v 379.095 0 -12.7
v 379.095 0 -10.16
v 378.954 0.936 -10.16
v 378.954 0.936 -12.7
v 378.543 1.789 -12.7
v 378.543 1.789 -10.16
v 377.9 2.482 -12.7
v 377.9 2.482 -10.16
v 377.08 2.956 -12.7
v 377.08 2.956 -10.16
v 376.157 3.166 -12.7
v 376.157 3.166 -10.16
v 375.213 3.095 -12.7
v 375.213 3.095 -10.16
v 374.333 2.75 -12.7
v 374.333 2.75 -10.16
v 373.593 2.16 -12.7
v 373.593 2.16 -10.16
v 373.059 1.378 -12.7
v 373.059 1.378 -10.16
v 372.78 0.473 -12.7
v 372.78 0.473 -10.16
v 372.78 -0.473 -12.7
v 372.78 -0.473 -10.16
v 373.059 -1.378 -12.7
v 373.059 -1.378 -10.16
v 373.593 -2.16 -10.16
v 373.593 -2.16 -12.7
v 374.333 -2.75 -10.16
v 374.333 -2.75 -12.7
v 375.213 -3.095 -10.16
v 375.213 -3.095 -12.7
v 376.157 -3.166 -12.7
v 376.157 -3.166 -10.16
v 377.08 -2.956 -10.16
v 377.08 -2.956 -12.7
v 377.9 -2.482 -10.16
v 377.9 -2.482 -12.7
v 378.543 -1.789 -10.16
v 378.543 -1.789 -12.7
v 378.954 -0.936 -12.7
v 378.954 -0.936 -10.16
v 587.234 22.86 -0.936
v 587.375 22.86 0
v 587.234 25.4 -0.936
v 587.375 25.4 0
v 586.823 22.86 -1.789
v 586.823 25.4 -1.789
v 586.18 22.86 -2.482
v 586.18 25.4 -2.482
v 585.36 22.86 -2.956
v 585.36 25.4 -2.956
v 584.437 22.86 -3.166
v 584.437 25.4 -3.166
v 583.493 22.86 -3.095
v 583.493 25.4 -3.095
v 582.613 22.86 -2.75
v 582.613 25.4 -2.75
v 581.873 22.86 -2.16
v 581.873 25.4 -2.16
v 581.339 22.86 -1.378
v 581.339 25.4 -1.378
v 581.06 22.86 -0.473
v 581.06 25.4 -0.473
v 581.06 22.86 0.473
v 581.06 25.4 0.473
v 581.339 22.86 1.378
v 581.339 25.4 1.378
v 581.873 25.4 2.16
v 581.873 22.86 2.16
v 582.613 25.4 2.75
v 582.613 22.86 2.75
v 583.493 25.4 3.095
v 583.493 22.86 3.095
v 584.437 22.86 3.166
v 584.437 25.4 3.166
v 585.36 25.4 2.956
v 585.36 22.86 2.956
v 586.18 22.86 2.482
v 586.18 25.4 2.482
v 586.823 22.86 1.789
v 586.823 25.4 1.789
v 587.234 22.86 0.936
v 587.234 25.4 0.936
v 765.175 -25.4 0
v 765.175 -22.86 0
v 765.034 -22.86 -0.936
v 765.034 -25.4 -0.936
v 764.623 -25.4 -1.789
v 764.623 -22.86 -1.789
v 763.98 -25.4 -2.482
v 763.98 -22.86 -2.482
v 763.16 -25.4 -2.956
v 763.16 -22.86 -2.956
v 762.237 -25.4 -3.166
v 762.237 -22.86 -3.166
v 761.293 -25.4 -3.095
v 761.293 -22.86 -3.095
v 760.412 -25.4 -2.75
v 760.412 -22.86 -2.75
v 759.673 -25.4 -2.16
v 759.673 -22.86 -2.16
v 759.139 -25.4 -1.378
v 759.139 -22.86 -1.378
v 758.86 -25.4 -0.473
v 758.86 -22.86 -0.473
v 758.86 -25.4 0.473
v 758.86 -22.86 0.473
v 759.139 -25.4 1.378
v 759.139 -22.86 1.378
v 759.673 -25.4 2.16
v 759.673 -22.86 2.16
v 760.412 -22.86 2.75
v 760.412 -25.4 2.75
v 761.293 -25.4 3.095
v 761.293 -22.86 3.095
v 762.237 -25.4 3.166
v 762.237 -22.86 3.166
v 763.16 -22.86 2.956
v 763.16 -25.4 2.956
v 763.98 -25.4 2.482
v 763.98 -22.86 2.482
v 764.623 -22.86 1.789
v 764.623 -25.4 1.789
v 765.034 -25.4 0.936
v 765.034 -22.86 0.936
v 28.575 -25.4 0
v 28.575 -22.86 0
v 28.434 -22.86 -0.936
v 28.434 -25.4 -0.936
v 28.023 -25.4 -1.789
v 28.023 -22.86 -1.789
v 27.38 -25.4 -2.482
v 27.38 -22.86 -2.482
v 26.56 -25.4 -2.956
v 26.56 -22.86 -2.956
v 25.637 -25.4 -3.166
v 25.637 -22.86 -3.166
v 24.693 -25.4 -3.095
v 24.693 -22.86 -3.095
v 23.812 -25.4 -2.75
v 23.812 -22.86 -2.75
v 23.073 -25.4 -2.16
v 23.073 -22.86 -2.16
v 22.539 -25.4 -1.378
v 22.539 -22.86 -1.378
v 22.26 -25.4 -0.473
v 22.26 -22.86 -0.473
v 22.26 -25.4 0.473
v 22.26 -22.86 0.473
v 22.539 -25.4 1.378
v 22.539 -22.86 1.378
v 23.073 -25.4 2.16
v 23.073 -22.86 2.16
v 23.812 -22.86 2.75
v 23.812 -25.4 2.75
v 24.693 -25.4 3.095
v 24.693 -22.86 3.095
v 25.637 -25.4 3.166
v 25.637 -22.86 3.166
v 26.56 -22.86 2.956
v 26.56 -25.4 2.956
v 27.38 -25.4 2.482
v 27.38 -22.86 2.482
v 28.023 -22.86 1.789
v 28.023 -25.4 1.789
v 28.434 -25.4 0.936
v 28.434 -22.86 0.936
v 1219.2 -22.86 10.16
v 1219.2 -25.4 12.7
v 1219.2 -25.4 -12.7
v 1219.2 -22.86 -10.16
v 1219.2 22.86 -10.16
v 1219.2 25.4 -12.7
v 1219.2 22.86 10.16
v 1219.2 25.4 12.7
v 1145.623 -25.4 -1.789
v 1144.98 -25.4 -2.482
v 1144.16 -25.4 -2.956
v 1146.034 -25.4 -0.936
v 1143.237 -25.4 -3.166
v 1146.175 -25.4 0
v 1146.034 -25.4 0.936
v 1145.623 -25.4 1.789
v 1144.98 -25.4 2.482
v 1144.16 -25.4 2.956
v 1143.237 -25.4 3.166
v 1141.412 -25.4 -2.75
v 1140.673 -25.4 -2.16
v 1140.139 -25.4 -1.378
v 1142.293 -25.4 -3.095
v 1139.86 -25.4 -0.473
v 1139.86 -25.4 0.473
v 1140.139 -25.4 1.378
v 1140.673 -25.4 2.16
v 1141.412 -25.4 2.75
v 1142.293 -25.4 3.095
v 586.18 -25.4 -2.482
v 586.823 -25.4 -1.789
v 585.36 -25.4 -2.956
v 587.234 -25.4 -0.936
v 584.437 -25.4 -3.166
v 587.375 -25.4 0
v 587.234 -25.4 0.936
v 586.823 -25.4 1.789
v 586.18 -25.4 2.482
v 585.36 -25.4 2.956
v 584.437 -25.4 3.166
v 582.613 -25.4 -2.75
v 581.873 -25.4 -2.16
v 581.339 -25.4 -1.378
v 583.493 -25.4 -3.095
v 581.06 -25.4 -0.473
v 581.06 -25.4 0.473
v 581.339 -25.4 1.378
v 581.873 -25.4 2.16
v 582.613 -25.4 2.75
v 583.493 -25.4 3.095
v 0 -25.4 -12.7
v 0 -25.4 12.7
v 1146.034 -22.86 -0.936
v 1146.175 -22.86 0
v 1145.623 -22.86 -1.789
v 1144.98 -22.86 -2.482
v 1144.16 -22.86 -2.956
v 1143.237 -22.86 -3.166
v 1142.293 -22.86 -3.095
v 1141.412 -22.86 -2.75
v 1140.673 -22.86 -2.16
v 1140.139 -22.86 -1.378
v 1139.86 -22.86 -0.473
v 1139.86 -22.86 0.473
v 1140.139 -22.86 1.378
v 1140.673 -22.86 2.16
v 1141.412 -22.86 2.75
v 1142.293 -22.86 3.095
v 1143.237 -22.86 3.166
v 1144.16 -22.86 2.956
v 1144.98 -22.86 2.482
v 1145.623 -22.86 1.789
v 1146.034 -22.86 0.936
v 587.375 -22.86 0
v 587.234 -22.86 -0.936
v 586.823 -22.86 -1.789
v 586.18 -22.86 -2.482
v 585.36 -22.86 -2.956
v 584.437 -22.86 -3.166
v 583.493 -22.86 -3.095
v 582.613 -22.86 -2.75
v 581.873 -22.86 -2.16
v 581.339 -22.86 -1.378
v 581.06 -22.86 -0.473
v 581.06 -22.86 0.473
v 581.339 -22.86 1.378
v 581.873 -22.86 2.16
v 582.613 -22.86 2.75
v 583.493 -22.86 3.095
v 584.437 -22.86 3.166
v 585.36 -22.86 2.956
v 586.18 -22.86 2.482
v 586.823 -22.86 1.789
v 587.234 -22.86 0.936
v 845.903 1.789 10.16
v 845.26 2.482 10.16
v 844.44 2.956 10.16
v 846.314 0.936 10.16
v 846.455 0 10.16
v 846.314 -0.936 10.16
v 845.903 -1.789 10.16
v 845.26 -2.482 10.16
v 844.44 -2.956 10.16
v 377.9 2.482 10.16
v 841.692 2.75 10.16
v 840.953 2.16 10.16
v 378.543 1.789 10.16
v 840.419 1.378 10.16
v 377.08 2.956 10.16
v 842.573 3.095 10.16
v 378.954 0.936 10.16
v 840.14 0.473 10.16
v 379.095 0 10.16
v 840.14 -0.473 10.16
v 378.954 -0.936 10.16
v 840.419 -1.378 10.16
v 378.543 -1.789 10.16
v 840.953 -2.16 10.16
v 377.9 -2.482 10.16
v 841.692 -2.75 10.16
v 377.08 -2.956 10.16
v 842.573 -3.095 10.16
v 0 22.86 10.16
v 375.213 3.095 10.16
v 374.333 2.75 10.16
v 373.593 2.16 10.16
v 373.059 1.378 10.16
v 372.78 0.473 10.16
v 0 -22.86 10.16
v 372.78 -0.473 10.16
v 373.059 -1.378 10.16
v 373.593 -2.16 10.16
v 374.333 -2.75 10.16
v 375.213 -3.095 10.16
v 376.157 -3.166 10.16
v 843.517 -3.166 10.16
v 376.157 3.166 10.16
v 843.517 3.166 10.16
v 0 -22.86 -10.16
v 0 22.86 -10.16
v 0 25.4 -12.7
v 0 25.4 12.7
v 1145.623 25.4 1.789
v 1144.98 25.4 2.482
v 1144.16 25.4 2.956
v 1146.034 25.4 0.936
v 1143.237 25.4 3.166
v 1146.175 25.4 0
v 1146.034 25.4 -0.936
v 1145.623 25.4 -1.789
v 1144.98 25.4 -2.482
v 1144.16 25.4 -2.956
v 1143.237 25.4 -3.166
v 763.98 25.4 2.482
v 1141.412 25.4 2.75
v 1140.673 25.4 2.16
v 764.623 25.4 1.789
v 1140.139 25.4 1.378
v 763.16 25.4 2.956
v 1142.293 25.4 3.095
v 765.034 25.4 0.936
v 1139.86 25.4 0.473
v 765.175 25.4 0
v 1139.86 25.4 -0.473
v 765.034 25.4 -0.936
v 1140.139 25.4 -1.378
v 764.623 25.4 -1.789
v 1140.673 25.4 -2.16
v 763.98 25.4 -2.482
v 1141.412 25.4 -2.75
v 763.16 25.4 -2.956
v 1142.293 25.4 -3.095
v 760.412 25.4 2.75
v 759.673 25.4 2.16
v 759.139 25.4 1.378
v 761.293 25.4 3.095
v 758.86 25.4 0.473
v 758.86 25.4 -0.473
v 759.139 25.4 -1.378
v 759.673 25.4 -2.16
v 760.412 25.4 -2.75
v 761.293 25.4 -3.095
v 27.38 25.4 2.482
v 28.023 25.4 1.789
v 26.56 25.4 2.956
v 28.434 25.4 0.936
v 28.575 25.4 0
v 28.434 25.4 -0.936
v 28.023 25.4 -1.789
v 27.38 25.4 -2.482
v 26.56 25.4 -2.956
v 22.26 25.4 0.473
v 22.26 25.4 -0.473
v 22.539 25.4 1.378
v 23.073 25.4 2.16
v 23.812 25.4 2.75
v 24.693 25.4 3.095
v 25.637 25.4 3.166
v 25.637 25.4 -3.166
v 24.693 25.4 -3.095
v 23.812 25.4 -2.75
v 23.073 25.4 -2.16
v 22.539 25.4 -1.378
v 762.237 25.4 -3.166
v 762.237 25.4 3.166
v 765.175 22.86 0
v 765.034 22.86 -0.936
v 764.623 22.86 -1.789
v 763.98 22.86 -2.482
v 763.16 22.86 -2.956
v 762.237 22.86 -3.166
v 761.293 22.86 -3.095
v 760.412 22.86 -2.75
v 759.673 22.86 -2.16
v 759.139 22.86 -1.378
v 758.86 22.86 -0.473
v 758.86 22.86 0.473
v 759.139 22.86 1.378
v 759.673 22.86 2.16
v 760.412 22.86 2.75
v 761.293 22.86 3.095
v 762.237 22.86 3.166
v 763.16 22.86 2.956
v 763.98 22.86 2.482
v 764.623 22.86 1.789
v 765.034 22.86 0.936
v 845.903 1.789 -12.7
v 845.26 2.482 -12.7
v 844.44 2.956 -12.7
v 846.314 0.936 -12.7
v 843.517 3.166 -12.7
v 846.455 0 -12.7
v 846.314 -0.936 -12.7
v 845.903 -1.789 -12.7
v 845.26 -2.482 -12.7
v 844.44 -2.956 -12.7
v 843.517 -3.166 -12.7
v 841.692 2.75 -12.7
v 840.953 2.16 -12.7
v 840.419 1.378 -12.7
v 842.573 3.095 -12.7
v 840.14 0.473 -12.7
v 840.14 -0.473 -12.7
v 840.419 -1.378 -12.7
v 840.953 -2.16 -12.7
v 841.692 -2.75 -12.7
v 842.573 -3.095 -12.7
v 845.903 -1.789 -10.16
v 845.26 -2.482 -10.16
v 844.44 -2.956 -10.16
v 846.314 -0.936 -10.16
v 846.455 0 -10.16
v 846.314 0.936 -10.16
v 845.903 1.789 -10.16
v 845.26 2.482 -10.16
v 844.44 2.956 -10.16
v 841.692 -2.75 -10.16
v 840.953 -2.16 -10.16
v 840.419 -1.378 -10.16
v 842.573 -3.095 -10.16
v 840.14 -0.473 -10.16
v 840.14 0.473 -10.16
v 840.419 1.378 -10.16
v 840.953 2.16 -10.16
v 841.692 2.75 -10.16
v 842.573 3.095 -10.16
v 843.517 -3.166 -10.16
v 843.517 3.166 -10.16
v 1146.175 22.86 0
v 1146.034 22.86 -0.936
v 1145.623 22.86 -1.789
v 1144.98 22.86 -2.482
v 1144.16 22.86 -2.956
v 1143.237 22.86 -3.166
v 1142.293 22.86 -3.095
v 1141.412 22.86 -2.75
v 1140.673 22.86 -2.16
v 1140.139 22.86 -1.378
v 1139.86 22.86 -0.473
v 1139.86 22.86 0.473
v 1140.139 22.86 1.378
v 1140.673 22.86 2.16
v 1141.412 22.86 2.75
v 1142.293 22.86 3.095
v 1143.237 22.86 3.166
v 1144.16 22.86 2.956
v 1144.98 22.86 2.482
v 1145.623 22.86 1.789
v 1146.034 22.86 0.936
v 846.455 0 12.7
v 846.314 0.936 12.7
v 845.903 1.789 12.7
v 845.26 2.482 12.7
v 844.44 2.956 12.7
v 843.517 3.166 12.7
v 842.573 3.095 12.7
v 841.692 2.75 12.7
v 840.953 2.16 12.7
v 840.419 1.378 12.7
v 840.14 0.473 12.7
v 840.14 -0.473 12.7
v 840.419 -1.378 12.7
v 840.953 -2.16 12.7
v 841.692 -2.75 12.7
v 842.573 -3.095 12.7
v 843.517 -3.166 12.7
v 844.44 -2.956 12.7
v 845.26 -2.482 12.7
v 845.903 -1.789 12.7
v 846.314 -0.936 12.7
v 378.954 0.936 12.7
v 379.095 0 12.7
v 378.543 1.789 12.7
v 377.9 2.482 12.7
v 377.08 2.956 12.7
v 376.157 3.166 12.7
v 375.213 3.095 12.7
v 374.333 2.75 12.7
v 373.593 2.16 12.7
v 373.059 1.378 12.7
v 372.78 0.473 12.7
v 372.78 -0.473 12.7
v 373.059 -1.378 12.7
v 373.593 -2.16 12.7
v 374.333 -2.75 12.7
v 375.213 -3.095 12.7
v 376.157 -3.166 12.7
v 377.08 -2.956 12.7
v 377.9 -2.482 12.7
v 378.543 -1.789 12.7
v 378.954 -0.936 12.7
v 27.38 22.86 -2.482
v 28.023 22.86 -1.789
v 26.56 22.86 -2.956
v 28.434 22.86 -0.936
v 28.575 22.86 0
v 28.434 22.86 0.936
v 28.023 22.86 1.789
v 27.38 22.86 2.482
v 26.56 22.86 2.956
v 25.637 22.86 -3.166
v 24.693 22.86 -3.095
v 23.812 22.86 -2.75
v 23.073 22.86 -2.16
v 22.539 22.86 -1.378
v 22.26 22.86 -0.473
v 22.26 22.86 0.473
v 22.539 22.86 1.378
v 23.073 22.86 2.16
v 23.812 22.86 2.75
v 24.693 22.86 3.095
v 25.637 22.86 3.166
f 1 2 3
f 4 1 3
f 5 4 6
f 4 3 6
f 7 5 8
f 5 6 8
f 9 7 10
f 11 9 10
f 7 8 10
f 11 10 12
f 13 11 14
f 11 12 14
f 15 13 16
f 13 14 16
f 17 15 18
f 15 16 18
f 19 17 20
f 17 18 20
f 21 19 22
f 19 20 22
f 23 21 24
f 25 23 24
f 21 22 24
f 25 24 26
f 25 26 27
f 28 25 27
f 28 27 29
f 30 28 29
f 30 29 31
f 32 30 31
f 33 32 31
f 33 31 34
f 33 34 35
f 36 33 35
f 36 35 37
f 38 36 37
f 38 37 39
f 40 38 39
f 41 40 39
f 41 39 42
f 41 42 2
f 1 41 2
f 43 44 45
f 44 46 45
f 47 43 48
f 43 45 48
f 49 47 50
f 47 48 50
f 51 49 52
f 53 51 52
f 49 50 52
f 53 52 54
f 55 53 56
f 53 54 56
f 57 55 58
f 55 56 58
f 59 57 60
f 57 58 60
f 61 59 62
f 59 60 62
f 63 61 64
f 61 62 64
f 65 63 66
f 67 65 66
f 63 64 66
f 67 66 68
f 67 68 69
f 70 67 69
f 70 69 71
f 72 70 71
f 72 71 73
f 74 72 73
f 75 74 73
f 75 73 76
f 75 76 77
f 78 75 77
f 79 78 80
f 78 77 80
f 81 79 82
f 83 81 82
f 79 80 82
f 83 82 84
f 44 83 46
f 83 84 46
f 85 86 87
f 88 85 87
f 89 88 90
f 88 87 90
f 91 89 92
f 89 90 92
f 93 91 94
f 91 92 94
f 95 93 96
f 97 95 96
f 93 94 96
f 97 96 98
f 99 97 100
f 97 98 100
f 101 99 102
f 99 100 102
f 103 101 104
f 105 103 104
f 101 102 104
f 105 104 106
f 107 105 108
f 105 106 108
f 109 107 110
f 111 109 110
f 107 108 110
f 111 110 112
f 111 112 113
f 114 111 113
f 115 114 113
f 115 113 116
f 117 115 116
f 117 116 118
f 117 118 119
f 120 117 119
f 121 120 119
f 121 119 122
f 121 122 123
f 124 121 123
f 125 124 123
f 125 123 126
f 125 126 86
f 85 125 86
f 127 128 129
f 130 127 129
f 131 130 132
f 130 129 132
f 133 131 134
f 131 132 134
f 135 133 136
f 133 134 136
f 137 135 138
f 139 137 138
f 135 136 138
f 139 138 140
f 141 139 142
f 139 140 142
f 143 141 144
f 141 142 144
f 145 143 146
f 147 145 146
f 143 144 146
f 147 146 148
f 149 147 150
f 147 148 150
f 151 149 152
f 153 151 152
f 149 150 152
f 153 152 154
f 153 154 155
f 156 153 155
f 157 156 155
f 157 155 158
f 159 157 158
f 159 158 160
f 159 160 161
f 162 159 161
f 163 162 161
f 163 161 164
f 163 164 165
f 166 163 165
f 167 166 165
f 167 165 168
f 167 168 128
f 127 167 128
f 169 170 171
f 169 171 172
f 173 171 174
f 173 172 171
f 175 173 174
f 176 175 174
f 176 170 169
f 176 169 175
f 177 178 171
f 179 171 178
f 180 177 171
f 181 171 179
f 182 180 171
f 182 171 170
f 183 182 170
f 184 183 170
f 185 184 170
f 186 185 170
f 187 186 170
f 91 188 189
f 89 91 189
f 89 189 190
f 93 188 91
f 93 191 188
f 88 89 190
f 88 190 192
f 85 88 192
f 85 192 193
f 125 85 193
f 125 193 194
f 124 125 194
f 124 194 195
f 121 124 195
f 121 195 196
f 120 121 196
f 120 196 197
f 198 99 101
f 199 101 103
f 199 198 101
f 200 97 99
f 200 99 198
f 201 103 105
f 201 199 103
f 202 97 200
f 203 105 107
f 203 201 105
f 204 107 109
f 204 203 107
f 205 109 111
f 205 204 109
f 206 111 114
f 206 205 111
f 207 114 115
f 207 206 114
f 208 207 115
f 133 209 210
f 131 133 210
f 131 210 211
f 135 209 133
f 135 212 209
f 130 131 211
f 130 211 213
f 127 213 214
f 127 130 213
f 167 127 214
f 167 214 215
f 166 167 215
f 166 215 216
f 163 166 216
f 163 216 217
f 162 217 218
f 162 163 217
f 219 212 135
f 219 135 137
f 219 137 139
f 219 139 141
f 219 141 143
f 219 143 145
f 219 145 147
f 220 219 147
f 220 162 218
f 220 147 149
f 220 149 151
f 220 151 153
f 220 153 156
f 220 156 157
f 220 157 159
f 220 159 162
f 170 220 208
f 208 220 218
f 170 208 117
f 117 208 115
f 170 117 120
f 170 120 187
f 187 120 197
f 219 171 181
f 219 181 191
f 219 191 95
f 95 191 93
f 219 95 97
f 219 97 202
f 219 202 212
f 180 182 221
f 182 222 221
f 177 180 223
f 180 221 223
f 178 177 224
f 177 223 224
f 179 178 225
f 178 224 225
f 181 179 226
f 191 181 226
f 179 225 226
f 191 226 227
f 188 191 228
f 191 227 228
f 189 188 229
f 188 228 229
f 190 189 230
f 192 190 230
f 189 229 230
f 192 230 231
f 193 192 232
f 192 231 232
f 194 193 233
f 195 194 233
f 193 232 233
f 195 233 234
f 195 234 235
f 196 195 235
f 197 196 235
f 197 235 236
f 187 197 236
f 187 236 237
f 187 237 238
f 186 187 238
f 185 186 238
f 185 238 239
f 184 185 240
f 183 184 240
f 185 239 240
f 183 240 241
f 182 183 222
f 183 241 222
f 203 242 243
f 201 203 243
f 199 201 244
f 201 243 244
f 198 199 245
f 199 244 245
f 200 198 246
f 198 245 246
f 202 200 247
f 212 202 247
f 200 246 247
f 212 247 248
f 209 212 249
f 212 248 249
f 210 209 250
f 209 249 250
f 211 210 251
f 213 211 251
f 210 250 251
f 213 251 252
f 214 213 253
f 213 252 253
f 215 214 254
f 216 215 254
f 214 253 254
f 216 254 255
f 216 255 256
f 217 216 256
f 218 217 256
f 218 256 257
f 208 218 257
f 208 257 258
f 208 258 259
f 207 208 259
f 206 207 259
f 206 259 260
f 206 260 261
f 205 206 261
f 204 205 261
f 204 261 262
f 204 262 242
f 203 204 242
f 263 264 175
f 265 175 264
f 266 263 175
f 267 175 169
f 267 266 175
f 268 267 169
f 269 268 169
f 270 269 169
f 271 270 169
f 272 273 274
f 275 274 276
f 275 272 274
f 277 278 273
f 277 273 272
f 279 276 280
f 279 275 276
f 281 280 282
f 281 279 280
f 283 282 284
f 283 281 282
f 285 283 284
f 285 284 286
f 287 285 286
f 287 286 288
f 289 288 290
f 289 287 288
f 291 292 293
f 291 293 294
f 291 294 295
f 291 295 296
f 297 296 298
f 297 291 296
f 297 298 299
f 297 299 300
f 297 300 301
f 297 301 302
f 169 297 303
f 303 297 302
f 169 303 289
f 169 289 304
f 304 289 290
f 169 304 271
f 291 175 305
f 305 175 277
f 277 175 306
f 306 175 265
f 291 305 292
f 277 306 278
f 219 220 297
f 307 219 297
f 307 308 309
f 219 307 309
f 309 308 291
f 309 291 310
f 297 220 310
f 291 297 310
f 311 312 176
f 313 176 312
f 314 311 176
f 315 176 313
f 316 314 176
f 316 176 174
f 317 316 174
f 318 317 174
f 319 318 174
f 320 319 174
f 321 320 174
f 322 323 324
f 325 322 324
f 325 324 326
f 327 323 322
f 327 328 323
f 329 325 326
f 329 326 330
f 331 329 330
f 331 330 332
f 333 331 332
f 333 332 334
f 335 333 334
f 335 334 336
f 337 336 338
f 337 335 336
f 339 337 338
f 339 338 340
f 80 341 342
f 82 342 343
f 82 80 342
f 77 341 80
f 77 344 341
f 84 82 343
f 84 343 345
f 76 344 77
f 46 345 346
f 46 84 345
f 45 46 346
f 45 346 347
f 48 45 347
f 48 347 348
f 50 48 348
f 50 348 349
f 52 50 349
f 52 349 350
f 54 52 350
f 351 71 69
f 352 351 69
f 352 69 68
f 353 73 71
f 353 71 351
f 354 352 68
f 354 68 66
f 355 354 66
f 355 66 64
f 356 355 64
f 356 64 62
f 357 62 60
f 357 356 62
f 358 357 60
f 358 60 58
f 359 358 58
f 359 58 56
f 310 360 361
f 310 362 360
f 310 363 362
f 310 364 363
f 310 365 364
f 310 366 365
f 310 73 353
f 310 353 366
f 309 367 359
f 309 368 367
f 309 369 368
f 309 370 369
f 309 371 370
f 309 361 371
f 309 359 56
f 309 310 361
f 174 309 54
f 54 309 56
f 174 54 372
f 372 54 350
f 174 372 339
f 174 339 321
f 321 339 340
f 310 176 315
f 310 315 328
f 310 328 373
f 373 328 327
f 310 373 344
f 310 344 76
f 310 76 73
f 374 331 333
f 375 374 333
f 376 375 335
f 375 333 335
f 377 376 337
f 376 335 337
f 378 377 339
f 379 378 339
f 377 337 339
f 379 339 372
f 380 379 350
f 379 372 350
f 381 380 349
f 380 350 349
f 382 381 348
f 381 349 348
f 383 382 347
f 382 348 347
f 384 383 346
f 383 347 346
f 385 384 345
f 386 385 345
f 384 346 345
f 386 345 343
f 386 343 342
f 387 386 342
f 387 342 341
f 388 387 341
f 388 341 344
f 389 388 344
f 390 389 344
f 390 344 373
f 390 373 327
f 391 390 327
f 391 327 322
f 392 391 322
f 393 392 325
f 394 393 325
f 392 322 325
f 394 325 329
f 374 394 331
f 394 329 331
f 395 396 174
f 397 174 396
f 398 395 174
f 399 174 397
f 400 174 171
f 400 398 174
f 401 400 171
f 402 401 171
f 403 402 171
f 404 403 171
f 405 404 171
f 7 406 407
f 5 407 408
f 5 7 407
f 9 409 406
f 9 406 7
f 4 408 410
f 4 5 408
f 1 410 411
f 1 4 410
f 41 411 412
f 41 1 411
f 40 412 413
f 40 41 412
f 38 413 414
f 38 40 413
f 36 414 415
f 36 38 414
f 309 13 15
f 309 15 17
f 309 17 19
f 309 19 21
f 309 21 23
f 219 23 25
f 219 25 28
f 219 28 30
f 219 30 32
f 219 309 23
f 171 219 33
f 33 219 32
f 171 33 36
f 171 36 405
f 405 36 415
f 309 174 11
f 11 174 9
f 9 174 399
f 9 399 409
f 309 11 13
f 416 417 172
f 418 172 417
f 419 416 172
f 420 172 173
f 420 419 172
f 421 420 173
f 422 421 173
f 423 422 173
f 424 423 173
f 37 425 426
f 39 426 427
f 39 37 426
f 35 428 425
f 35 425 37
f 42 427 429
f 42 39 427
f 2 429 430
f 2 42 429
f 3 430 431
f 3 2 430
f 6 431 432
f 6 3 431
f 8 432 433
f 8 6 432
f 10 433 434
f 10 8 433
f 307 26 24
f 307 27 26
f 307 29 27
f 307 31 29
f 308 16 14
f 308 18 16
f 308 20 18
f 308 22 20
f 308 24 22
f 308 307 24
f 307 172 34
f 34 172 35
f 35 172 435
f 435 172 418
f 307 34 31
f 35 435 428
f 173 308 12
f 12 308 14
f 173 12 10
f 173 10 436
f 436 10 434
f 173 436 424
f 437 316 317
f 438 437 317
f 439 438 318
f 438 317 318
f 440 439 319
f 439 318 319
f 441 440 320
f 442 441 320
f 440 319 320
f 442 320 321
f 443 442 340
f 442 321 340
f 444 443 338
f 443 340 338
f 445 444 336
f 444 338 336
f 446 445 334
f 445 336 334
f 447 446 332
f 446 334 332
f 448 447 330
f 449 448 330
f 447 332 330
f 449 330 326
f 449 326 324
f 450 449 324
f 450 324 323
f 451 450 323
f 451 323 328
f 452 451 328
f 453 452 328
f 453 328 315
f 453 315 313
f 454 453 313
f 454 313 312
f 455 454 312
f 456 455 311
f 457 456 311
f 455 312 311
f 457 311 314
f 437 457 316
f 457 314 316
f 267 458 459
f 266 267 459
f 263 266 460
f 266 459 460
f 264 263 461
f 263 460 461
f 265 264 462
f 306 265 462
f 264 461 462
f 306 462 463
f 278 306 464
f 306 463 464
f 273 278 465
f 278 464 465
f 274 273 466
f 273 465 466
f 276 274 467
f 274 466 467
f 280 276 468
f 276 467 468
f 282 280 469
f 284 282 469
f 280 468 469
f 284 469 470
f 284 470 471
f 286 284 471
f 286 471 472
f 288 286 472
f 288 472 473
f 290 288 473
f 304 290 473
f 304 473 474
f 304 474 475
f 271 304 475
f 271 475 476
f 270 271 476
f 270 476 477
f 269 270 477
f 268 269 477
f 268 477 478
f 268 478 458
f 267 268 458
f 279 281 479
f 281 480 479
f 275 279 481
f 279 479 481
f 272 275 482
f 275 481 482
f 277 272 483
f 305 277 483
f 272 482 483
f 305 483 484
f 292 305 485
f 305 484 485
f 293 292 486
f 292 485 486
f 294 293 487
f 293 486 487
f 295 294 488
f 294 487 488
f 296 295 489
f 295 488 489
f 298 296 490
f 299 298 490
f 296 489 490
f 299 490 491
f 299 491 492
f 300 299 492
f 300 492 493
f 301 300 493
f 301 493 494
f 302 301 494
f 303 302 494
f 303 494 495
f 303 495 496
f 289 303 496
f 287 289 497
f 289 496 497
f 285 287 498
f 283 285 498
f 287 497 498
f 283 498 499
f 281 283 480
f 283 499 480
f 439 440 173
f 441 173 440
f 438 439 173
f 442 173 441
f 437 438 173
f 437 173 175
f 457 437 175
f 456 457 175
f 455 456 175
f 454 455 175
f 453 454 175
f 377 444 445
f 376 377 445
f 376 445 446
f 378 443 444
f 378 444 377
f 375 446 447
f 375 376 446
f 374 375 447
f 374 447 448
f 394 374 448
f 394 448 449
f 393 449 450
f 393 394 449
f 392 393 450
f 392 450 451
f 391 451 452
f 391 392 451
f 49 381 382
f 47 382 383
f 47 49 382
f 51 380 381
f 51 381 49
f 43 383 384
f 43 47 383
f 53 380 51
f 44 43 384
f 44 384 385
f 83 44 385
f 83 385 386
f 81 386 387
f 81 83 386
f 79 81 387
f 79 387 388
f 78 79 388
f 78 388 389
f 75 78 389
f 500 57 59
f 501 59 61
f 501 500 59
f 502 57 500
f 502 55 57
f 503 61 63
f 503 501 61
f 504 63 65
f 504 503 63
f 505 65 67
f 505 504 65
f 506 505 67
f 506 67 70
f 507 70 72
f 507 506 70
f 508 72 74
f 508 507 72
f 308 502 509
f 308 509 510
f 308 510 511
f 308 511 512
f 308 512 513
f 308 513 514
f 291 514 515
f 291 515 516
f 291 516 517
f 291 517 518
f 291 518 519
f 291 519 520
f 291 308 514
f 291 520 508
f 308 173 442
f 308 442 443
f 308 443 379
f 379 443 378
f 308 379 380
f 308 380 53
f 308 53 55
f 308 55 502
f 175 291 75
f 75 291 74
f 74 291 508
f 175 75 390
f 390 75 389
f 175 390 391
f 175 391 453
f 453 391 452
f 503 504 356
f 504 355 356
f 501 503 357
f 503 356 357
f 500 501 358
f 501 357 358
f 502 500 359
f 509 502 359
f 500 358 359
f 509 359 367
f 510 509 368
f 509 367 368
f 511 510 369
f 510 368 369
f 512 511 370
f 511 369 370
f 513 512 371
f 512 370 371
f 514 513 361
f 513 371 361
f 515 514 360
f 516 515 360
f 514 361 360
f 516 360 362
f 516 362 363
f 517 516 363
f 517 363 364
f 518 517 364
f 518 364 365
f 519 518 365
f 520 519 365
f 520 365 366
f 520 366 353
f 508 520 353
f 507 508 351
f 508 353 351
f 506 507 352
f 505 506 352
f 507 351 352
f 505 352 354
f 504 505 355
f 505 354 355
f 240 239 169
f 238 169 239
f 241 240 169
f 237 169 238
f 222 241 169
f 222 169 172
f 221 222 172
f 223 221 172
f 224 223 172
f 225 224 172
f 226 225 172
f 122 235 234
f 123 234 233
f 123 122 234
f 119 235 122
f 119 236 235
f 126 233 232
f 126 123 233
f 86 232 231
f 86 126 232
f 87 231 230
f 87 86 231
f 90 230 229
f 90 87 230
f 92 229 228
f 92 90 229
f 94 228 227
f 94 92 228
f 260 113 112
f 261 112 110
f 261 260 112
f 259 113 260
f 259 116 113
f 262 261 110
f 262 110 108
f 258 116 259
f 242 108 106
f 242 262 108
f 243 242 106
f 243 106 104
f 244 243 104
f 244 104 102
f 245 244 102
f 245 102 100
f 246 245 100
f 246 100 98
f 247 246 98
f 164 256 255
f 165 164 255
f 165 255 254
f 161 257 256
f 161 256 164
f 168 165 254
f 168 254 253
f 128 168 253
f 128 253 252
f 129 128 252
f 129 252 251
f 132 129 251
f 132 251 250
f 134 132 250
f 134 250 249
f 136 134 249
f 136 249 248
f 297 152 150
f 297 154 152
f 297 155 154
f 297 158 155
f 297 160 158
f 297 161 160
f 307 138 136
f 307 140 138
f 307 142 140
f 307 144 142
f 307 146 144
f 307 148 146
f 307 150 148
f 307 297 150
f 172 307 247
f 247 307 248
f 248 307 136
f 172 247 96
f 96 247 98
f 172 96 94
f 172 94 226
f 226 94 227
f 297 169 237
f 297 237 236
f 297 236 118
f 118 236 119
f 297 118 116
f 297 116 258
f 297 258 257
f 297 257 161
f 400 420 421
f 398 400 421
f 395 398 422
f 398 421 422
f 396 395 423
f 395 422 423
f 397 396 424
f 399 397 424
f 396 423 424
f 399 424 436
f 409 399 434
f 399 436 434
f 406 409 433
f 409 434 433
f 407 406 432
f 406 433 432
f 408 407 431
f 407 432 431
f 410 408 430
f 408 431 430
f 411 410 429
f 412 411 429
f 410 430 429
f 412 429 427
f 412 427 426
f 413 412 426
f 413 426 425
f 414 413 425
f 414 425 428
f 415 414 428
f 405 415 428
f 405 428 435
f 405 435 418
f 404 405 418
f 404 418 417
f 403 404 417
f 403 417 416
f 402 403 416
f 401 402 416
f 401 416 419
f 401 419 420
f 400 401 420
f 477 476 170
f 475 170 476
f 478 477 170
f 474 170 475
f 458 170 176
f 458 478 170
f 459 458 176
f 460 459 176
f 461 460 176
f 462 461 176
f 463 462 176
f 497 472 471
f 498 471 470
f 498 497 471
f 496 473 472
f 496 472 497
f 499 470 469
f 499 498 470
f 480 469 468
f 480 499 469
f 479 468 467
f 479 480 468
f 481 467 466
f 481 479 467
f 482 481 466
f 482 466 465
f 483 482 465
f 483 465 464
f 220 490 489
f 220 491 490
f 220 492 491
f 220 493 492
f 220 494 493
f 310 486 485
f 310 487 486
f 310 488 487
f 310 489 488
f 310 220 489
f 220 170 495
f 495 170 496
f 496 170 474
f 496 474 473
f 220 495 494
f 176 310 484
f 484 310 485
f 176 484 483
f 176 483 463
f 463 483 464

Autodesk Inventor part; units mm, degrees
ref_plane "YZ Plane" through (0, 0, 0) normal (1, 0, 0) x (0, 1, 0)
ref_plane "XZ Plane" through (0, 0, 0) normal (0, 1, 0) x (-1, 0, 0)
ref_plane "XY Plane" through (0, 0, 0) normal (0, 0, 1) x (1, 0, 0)
sketch "Sketch1" plane through (0, 0, 0) normal (1, 0, 0) x (0, 1, 0)
  line L0 (-12.7, 12.7) -> (12.7, 12.7)
  line L1 (12.7, -12.7) -> (-12.7, -12.7)
  line L2 (12.7, 12.7) -> (25.4, 12.7)
  line L3 (25.4, 12.7) -> (25.4, -12.7)
  line L4 (25.4, -12.7) -> (12.7, -12.7)
  line L5 (-12.7, -12.7) -> (-25.4, -12.7)
  line L6 (-25.4, -12.7) -> (-25.4, 12.7)
  line L7 (-25.4, 12.7) -> (-12.7, 12.7)
  line L8 (22.86, -10.16) -> (22.86, 10.16)
  line L9 (22.86, 10.16) -> (12.7, 10.16)
  line L10 (12.7, 10.16) -> (-12.7, 10.16)
  line L11 (-12.7, 10.16) -> (-22.86, 10.16)
  line L12 (-22.86, 10.16) -> (-22.86, -10.16)
  line L13 (-22.86, -10.16) -> (-12.7, -10.16)
  line L14 (-12.7, -10.16) -> (12.7, -10.16)
  line L15 (12.7, -10.16) -> (22.86, -10.16)
  point P0 (0, 0)
  dimension "d1" = 25.4
  dimension "d14" = 25.4
  dimension "d15" = 50.8
  dimension "d16" = 12.7
  dimension "d17" = 2.54
extrude "Extrusion1" add sketch "Sketch1" along normal blind 1219.2
sketch "Sketch3" plane through (0, -25.4, 12.7) normal (0, 0, 1) x (1, 0, 0)
  line L0 (0, 25.4) -> (1219.2, 25.4) construction
  line L1 (1219.2, 0) -> (1219.2, 50.8) construction
  line L2 (0, 50.8) -> (1219.2, 50.8) construction
  line L3 (609.6, 50.8) -> (609.6, 0) construction
  line L4 (0, 0) -> (1219.2, 0) construction
  circle A0 centre (843.28, 25.4) radius 3.175
  circle A1 centre (375.92, 25.4) radius 3.175
  dimension "d20" = 6.35
  dimension "d21" = 233.68
  dimension "d22" = 233.68
extrude "Extrusion3" cut sketch "Sketch3" against normal through all
sketch "Sketch4" plane through (0, 25.4, 12.7) normal (0, 1, 0) x (1, 0, 0)
  line L0 (1219.2, 0) -> (1219.2, 25.4) projected
  line L1 (1219.2, 12.7) -> (0, 12.7) construction
  circle A0 centre (25.4, 12.7) radius 3.175
  circle A1 centre (1143, 12.7) radius 3.175
  line L2 (0, 25.4) -> (1219.2, 25.4) construction
  line L3 (609.6, 25.4) -> (609.6, 0) construction
  line L4 (0, 0) -> (1219.2, 0) construction
  line L5 (0, 25.4) -> (0, 0) projected
  circle A2 centre (762, 12.7) radius 3.175
  circle A3 centre (584.2, 12.7) radius 3.175
  dimension "d25" = 6.35
  dimension "d32" = 25.4
  dimension "d33" = 76.2
  dimension "d34" = 152.4
  dimension "d35" = 381
  dimension "d36" = 635
extrude "Extrusion4" cut sketch "Sketch4" against normal through all
equation "\"d14\" = 0.5 * d15"
equation "\"d16\" = 0.5 * d1"
equation "\"d22\" = d21"
properties part number "support-beam"
